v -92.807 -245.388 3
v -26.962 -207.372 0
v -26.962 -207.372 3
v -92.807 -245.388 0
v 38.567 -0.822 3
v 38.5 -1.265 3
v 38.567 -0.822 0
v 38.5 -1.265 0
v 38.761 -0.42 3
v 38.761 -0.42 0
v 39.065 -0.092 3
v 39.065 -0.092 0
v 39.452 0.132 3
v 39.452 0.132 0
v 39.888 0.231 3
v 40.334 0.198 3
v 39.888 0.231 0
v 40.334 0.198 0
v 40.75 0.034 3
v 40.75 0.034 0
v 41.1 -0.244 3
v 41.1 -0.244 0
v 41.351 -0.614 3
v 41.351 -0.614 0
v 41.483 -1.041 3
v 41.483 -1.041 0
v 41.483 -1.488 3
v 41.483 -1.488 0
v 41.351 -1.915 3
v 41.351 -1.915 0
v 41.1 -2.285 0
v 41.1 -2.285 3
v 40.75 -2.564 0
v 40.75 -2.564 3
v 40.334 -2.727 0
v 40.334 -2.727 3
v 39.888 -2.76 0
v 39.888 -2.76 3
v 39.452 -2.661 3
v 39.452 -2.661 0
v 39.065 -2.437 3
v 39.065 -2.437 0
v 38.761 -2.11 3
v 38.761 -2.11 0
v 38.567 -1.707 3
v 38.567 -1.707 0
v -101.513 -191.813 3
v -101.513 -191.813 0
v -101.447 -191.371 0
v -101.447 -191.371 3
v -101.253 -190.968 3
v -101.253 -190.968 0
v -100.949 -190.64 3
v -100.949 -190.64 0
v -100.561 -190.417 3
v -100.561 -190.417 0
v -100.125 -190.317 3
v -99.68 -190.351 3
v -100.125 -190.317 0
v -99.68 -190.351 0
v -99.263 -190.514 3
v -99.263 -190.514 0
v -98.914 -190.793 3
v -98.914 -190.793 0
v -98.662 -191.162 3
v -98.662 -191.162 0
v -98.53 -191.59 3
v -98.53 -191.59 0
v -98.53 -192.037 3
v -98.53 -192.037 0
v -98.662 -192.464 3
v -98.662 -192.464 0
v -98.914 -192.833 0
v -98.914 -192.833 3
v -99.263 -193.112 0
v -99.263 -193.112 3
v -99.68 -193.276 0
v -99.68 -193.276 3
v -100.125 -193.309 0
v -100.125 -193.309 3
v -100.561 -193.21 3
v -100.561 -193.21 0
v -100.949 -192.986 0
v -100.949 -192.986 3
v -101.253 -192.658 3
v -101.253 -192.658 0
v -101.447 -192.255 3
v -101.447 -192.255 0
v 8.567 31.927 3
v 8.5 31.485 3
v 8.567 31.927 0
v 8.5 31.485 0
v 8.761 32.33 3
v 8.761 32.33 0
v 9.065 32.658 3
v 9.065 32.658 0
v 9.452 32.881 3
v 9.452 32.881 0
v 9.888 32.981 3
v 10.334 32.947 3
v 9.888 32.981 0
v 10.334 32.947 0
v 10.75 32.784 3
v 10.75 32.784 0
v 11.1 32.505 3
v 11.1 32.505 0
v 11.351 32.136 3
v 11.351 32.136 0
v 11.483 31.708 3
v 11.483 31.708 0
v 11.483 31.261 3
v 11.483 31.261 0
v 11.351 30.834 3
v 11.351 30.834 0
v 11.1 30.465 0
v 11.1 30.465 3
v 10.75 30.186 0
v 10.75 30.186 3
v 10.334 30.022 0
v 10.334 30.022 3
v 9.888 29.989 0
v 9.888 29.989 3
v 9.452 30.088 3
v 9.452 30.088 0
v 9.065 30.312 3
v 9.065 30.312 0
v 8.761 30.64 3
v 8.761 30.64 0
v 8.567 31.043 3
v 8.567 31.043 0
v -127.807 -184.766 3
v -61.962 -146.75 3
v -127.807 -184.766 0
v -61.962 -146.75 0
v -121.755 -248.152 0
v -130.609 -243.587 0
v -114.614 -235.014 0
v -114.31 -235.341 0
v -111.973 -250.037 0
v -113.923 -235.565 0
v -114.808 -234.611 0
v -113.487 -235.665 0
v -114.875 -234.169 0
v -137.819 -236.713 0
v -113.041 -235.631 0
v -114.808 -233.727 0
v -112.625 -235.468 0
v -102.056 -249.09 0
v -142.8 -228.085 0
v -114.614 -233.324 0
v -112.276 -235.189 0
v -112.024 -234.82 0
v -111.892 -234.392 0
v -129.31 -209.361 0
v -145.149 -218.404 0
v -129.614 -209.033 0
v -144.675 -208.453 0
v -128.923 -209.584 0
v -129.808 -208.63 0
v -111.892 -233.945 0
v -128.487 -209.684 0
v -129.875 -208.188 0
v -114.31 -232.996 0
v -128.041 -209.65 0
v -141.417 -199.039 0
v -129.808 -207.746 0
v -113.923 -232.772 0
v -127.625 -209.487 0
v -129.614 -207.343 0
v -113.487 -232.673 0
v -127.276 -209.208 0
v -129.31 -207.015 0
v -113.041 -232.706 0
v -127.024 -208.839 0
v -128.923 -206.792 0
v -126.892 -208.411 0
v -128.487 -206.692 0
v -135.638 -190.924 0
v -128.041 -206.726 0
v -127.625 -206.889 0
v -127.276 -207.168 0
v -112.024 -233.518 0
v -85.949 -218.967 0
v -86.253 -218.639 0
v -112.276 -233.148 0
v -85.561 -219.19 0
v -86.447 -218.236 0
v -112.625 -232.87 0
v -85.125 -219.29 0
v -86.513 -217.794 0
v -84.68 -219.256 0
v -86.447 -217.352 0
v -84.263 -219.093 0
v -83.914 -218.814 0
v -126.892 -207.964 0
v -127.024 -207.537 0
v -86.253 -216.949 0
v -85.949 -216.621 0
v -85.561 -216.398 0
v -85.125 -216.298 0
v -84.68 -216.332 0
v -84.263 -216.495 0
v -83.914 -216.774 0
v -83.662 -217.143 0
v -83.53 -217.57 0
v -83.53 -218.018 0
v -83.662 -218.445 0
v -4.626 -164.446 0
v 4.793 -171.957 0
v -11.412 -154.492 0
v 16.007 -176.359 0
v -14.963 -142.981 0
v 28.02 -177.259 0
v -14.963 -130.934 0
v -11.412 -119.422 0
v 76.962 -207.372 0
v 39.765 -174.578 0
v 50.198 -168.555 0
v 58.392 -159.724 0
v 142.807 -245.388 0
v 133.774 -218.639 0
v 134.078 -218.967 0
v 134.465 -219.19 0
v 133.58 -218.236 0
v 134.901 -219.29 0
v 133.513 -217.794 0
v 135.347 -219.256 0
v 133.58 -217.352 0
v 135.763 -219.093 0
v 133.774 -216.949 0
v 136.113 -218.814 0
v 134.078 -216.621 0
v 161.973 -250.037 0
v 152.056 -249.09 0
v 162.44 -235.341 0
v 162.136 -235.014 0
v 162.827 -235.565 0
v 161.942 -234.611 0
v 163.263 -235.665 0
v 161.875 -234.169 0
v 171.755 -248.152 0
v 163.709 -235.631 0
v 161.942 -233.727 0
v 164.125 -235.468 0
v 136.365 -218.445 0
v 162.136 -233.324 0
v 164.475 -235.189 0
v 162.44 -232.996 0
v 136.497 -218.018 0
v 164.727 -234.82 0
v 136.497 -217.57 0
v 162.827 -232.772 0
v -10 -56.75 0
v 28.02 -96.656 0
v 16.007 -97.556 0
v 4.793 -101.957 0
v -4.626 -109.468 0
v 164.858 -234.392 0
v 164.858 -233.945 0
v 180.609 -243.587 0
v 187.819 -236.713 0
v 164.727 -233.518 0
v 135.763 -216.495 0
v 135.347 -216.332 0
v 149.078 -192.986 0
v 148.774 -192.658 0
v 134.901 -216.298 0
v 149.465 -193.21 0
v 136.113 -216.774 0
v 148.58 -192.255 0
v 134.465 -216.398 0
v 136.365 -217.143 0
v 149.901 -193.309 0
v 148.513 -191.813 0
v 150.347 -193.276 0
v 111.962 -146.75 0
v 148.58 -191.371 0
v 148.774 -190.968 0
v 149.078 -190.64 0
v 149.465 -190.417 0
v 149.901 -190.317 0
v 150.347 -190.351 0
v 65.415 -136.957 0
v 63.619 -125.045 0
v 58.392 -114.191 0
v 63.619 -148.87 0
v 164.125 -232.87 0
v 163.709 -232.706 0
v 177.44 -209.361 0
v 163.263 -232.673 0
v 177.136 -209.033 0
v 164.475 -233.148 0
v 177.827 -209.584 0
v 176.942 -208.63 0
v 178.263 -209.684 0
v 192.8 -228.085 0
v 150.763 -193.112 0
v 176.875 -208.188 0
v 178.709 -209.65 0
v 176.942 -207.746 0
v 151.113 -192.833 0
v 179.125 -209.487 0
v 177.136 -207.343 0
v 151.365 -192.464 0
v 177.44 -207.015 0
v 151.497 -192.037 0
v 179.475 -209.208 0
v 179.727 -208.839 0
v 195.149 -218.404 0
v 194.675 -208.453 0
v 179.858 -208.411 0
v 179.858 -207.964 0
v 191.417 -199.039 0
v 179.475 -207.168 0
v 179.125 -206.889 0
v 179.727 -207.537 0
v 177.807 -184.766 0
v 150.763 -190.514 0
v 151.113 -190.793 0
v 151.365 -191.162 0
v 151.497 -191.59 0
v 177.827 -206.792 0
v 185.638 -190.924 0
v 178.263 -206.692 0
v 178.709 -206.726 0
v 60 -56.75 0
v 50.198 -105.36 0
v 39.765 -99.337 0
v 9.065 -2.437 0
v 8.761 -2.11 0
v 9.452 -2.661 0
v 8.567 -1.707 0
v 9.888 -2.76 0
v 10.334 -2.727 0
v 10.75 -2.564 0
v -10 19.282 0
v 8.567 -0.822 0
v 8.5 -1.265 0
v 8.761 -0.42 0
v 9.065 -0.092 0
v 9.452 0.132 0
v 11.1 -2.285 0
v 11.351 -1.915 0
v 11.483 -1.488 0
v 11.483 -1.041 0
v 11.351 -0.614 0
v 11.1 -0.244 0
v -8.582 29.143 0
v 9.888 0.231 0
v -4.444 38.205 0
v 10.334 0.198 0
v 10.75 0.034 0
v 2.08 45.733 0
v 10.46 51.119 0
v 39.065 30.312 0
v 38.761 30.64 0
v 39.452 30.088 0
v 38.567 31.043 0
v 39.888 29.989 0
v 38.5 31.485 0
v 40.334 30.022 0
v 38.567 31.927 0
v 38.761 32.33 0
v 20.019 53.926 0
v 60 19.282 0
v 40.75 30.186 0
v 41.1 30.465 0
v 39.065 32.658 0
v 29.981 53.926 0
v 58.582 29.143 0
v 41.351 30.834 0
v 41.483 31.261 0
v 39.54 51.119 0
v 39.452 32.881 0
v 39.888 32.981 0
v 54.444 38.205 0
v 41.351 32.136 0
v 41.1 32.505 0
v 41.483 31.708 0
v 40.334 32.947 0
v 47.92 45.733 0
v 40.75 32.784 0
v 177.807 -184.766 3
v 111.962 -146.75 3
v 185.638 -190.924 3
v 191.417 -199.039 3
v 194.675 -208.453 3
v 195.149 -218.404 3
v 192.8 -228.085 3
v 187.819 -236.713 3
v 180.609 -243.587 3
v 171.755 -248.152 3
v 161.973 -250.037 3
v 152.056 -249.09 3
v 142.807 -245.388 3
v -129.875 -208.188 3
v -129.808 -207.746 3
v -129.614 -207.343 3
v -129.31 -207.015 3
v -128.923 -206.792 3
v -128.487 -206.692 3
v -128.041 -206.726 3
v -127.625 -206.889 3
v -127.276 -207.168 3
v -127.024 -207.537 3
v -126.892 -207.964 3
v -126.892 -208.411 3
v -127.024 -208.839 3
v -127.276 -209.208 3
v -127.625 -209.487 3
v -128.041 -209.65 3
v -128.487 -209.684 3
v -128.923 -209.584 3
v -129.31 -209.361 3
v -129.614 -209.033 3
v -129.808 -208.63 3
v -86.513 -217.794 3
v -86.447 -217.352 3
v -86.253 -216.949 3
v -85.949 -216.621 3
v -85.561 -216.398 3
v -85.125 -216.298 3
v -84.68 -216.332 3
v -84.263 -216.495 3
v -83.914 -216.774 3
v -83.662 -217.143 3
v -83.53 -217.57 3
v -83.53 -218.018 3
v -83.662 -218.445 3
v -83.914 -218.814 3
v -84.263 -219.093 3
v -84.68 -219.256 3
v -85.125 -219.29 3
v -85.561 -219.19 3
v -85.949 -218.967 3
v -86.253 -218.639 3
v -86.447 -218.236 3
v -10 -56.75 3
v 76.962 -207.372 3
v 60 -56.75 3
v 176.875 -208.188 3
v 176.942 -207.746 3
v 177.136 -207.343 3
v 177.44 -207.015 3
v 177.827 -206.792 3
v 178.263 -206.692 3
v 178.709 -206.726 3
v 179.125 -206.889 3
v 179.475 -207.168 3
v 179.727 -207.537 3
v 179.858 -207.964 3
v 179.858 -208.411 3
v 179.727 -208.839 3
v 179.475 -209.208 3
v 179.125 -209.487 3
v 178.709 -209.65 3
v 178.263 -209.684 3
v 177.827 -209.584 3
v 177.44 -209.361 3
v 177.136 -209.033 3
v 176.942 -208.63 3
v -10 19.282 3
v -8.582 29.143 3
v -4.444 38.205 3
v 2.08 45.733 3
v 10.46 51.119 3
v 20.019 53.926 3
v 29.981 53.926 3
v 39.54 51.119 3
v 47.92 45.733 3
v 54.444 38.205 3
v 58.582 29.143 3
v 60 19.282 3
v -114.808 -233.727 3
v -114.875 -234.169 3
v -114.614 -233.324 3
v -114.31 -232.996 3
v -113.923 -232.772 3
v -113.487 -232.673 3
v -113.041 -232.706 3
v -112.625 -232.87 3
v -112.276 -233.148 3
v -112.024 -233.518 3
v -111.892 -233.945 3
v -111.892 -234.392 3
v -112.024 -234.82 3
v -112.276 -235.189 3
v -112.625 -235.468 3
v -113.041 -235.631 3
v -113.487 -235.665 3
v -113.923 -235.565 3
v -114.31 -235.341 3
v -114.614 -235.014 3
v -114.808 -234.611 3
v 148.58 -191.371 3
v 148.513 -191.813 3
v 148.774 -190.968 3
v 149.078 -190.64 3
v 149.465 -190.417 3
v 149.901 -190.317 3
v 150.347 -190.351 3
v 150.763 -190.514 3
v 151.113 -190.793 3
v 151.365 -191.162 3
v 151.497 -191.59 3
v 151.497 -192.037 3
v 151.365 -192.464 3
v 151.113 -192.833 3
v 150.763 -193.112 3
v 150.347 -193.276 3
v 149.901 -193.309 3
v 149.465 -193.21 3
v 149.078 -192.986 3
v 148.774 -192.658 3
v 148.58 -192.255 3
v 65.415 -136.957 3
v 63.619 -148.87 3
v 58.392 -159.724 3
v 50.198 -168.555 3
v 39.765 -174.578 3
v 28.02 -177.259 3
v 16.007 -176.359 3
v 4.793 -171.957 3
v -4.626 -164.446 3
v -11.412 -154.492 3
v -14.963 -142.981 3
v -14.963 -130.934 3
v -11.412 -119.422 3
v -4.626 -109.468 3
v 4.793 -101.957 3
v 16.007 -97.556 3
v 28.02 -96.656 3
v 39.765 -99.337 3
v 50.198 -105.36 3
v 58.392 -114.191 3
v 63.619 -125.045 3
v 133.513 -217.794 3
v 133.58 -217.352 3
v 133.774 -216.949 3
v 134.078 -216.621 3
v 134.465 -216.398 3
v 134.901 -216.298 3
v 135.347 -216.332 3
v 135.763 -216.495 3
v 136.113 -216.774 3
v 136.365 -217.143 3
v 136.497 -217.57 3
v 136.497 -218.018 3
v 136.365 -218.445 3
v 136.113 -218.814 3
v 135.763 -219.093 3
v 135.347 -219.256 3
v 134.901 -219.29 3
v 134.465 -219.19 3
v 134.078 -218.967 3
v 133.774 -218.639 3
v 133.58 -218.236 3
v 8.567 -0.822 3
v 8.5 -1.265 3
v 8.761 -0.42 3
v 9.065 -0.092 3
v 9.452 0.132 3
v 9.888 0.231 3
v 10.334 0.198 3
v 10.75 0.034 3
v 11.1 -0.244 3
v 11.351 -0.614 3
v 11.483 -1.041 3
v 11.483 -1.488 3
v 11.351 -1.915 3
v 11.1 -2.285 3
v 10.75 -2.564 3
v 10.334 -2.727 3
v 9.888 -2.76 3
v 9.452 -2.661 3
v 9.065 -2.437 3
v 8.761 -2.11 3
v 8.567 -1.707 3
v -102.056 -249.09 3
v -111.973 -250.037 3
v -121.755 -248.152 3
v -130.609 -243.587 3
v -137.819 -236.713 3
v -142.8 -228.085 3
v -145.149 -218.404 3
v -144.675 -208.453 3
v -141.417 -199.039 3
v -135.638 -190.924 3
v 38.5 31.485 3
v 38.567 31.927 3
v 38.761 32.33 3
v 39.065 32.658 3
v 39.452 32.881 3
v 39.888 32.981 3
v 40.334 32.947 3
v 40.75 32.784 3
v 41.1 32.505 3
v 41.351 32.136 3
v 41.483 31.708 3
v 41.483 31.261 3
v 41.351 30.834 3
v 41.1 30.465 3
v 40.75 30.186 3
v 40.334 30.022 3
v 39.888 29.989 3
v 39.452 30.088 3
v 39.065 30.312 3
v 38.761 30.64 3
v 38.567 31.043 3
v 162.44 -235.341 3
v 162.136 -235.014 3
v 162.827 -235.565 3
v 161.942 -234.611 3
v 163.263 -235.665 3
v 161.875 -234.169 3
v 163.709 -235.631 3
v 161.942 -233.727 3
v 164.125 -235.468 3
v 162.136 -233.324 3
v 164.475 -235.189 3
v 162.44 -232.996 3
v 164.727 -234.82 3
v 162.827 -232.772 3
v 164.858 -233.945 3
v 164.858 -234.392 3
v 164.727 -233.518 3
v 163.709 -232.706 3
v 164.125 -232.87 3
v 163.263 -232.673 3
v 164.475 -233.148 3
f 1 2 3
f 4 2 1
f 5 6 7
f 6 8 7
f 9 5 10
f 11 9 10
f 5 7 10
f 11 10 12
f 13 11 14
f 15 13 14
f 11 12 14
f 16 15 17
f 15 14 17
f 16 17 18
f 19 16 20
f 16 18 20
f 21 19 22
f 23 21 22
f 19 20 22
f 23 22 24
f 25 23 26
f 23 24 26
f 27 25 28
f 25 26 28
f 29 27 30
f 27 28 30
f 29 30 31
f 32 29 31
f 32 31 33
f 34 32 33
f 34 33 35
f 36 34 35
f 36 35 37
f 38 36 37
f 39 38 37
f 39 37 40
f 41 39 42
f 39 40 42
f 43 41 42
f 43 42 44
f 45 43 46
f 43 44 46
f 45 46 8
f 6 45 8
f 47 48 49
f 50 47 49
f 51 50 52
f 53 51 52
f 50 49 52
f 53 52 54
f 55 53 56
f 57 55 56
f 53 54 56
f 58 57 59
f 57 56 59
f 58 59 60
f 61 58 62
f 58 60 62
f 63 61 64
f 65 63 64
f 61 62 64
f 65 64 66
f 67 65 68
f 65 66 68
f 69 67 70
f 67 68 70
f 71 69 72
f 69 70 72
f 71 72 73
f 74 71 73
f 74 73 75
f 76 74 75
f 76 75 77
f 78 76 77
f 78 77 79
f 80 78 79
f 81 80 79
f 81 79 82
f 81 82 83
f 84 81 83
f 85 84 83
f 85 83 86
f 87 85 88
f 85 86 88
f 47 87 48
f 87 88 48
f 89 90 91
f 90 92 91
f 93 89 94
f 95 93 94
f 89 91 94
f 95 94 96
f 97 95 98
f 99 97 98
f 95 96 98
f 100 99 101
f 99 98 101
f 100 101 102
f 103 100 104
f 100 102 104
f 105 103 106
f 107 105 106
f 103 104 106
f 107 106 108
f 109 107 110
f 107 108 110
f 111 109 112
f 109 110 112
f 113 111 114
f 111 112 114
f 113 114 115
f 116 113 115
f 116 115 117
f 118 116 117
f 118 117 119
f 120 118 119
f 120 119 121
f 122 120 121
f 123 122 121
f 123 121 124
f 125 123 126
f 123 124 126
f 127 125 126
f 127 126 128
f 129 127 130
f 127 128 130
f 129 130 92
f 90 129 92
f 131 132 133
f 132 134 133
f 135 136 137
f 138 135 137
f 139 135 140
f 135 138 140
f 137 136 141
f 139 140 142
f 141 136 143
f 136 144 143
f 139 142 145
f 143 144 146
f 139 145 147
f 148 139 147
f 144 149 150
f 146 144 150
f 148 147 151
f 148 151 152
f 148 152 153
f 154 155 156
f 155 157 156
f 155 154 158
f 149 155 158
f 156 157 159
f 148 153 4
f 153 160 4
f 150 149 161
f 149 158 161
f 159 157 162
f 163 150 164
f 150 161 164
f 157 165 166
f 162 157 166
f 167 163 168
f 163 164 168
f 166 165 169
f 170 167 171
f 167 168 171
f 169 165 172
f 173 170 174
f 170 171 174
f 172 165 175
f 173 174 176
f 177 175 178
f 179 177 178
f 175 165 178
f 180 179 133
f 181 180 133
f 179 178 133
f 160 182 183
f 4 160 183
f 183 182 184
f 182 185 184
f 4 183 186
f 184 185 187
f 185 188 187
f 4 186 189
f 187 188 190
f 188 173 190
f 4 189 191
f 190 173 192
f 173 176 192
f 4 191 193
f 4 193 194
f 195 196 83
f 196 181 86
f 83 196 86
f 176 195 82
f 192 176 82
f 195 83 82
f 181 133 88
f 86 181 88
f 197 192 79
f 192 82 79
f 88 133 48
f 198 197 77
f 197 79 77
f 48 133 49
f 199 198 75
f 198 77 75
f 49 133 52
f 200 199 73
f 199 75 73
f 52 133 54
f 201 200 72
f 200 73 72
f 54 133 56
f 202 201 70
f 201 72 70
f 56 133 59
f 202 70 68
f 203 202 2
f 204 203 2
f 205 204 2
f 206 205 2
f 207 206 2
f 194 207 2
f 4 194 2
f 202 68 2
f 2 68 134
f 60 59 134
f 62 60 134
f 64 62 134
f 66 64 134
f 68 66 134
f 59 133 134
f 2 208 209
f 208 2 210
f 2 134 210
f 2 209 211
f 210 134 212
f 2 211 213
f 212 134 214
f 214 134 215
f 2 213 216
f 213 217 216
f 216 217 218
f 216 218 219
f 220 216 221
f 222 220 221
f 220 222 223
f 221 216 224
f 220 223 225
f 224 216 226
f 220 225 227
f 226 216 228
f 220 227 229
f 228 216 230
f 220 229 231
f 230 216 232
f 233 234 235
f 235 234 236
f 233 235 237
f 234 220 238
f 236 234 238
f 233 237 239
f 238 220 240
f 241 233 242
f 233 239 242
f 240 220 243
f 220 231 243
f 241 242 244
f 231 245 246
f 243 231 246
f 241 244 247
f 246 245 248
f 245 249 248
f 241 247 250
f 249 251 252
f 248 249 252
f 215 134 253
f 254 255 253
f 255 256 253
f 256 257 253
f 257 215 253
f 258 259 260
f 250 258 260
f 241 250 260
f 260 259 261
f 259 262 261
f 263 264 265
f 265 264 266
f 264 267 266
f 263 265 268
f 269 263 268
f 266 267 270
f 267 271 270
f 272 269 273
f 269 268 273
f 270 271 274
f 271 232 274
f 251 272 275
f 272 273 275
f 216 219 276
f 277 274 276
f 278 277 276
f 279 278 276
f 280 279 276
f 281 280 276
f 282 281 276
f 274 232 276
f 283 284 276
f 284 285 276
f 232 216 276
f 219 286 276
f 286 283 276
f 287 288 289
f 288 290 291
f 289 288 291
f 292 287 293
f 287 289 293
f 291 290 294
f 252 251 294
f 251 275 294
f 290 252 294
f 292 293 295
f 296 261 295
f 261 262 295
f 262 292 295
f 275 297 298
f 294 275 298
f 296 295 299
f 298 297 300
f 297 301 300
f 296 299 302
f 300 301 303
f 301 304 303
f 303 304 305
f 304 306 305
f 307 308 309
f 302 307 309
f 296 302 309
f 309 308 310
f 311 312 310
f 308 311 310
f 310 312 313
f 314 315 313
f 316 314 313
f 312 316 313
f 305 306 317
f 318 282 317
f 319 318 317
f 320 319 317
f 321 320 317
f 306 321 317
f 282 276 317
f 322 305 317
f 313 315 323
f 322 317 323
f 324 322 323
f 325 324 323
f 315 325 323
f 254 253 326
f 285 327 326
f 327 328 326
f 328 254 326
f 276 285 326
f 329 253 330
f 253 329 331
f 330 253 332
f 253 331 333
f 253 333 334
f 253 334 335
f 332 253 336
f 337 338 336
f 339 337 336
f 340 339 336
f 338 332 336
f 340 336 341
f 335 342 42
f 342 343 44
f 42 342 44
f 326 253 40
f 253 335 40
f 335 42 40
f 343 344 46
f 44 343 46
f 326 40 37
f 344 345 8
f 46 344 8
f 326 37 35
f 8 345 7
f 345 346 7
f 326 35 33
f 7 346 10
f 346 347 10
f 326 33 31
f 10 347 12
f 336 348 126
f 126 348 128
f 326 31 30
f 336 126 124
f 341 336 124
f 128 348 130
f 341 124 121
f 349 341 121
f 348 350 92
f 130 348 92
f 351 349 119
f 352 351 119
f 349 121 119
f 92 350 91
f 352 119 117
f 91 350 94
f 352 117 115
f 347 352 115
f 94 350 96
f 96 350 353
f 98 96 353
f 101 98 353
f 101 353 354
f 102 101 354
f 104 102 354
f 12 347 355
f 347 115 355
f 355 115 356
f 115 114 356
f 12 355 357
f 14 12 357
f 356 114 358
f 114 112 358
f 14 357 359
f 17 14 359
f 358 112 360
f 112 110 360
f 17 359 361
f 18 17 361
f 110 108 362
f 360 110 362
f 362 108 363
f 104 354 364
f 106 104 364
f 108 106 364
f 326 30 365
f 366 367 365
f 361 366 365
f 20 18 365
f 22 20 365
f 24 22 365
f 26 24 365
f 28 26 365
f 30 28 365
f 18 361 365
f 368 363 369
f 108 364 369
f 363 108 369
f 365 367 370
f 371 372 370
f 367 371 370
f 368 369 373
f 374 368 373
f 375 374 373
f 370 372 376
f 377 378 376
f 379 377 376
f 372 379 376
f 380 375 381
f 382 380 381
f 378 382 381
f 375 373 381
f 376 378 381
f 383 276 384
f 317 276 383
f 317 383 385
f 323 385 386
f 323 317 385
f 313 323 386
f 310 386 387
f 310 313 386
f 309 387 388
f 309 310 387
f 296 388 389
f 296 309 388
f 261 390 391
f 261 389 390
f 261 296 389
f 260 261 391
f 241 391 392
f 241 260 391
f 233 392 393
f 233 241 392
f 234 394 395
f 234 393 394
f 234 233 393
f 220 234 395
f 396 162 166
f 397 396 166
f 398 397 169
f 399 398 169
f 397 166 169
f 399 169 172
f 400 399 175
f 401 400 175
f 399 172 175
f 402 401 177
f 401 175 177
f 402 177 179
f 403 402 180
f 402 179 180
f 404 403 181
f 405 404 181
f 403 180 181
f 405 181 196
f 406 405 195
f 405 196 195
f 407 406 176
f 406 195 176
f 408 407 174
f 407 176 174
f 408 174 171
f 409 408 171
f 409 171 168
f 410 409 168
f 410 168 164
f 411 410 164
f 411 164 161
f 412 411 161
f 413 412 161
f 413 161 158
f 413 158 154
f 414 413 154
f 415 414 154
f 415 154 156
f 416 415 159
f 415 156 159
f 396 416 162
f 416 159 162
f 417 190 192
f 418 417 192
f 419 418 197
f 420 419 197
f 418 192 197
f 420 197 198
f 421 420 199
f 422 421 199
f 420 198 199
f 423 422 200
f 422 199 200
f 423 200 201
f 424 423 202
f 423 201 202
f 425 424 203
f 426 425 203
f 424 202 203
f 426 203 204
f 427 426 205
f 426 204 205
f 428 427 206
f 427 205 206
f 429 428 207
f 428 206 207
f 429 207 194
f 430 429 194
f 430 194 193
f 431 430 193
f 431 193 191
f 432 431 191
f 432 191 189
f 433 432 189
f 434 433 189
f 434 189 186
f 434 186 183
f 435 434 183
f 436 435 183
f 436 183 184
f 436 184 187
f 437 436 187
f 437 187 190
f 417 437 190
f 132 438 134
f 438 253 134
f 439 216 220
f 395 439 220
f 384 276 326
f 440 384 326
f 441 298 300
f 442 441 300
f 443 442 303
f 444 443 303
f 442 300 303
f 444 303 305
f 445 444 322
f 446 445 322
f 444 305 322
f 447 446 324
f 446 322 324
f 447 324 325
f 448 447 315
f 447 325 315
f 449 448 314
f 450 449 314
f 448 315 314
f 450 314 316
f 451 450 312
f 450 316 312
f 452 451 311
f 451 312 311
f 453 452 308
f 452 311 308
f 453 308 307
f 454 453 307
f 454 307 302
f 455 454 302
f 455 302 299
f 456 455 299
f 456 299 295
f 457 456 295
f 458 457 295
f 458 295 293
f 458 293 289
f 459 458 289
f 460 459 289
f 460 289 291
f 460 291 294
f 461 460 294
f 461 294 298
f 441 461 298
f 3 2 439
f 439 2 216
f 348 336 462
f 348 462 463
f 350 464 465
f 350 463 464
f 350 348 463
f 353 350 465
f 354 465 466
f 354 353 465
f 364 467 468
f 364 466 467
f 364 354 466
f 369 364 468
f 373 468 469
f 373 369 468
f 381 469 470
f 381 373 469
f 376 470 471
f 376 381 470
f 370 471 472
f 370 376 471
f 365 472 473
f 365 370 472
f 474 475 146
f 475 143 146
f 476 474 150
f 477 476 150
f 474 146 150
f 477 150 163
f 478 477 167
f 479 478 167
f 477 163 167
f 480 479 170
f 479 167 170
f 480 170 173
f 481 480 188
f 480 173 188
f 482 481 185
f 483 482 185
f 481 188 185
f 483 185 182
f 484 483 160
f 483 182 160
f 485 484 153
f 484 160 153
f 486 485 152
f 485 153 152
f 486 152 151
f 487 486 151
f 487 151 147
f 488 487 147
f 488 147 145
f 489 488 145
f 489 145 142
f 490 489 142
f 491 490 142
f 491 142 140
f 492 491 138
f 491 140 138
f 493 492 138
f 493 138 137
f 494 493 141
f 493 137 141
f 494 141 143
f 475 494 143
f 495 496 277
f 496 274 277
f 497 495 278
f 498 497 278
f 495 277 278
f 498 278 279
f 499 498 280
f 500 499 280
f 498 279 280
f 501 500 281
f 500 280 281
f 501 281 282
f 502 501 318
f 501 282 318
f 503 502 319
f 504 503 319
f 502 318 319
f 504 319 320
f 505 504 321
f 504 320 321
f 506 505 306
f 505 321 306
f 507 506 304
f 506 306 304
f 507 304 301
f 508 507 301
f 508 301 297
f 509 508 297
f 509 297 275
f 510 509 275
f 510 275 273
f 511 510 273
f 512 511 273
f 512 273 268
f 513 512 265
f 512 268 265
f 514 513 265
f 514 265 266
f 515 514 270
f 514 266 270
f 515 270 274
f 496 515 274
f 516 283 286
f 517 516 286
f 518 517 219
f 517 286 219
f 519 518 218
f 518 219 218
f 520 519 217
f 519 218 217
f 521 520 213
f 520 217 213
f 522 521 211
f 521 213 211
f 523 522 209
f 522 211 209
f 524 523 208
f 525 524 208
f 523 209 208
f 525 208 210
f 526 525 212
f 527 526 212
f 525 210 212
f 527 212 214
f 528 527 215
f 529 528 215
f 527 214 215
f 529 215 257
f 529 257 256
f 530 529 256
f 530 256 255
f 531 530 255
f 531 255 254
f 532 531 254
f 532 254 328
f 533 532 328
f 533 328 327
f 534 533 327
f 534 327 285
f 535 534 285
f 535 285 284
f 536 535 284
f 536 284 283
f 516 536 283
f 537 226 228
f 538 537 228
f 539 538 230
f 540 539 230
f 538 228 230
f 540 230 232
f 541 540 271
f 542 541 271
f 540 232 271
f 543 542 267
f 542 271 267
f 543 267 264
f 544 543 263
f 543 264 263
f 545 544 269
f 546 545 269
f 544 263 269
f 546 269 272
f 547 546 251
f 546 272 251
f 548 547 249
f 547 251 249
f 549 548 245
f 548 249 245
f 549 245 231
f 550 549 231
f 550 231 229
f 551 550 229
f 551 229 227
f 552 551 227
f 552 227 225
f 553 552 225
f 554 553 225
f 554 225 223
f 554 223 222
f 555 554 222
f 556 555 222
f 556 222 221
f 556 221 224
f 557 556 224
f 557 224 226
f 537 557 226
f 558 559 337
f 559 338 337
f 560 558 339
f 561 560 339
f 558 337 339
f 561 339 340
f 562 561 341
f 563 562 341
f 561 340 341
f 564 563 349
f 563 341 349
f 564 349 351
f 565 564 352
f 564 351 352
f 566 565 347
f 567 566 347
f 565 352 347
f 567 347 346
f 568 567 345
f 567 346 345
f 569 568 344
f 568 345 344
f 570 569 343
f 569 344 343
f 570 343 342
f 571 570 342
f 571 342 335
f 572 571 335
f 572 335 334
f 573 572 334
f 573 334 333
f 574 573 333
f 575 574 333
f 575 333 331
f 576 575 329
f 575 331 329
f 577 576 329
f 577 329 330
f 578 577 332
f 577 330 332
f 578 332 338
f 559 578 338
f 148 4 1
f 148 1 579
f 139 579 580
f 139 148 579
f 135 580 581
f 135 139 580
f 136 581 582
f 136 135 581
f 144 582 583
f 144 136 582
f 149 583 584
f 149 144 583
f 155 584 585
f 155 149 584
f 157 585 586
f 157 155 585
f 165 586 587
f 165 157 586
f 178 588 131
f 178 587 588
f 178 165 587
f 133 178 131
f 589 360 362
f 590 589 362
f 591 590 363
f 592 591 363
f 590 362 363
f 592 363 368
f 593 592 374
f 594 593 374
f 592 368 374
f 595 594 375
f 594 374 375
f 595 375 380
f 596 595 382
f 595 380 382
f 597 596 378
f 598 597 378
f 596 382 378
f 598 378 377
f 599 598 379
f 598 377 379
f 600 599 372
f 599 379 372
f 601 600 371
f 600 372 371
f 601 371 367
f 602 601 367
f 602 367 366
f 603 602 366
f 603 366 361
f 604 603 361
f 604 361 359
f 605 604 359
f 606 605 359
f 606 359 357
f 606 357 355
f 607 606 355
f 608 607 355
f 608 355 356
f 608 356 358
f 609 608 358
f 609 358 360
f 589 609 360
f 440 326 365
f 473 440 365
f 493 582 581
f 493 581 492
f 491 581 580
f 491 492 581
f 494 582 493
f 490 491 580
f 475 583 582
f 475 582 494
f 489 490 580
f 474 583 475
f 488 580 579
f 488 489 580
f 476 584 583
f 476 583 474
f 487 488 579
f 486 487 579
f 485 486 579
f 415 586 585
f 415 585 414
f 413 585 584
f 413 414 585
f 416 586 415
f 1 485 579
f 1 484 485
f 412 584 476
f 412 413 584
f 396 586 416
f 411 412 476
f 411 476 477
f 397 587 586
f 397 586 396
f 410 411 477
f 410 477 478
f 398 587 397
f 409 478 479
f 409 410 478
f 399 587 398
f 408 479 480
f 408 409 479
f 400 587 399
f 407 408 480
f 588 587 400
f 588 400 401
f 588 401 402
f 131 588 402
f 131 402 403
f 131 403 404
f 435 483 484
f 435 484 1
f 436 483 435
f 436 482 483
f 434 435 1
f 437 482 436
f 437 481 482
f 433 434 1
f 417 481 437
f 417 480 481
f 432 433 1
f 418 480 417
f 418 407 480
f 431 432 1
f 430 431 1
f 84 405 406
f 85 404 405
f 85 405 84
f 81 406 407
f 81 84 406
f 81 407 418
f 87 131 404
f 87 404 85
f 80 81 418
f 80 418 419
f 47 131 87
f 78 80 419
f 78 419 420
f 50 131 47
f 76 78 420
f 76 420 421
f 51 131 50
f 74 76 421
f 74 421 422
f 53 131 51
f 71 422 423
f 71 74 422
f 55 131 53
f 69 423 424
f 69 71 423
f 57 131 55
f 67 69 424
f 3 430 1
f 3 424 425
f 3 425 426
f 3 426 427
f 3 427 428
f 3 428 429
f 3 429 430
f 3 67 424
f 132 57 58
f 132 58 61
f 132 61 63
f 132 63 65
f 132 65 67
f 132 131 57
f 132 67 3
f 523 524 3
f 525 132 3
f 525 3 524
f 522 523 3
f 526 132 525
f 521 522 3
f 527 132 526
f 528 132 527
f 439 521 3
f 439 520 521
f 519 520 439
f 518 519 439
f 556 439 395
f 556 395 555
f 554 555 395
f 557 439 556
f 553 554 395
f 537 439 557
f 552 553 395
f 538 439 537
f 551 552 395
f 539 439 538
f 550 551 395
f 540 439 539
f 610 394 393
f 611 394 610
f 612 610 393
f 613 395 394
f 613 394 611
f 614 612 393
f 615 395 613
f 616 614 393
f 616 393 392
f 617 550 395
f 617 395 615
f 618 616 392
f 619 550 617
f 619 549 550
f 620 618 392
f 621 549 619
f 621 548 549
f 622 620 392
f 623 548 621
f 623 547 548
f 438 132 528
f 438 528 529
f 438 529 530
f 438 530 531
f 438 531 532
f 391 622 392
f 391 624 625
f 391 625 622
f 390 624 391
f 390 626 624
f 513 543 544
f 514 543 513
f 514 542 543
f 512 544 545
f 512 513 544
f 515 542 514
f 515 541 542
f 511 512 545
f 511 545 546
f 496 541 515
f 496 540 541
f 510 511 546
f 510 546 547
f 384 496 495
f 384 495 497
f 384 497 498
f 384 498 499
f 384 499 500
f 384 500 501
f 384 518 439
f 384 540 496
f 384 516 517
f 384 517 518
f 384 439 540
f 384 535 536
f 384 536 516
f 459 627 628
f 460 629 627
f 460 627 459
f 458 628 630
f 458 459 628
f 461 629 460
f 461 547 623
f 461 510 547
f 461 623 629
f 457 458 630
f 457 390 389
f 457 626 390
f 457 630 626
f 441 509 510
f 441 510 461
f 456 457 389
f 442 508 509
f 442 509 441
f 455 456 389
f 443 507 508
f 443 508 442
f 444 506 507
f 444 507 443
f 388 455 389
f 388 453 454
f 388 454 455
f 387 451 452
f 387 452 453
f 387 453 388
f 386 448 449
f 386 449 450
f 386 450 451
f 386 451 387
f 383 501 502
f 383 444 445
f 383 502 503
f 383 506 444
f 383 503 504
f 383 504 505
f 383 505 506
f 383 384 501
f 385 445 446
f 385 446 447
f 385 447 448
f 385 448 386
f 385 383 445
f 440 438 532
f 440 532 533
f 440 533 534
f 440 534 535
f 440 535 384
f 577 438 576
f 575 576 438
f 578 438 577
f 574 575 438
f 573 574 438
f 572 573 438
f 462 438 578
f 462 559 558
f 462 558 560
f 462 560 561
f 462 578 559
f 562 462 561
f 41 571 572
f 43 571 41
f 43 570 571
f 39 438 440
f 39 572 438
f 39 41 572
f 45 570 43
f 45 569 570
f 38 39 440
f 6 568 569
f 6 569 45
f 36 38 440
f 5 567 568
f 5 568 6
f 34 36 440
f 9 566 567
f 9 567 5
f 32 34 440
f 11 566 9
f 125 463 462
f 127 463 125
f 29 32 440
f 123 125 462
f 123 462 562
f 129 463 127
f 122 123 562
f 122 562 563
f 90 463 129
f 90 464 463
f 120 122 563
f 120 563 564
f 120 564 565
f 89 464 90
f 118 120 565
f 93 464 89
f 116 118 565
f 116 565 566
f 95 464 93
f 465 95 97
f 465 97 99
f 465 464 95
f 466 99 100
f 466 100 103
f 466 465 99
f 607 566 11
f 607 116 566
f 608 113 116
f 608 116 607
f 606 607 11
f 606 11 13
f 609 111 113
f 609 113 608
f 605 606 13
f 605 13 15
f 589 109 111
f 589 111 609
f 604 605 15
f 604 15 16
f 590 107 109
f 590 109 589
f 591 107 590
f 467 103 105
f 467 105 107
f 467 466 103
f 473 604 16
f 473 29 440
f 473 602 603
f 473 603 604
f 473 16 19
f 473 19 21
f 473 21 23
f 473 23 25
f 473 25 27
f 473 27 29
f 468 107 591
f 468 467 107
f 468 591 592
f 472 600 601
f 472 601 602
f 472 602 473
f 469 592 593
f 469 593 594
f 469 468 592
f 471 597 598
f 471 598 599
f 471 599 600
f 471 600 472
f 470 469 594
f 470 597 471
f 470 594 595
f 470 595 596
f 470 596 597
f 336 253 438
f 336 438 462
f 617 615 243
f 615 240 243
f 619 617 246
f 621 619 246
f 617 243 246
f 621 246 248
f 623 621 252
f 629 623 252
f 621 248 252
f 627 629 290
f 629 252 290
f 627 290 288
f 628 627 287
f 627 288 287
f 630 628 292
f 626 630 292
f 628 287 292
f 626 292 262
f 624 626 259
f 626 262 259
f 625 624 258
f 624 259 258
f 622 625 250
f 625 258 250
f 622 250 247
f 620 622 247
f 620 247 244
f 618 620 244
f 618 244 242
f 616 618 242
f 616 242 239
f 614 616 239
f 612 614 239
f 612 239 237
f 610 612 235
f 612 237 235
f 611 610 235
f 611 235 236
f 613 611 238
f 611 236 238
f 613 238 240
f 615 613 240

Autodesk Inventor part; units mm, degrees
ref_plane "YZ Plane" through (0, 0, 0) normal (1, 0, 0) x (0, 1, 0)
ref_plane "XZ Plane" through (0, 0, 0) normal (0, 1, 0) x (-1, 0, 0)
ref_plane "XY Plane" through (0, 0, 0) normal (0, 0, 1) x (1, 0, 0)
ref_plane "Work Plane1" through (0, 0, 0) normal (0, 0, 1) x (1, 0, 0)
sketch "Sketch1" plane through (0, 0, 0) normal (0, 0, 1) x (1, 0, 0)
  circle A0 centre (25, -136.9573) radius 110
  line L0 (-96.6901, -226.845) -> (-113.6901, -197.4001)
  line L1 (-101.8073, -229.7994) -> (-118.8073, -200.3545)
  line L2 (163.6901, -197.4001) -> (146.6901, -226.845)
  line L3 (168.8073, -200.3545) -> (151.8073, -229.7994)
  line L4 (8, 13.3733) -> (42, 13.3733)
  line L5 (8, 19.2822) -> (42, 19.2822)
  line L6 (25, -136.9573) -> (25, 19.2822)
  line L7 (25, -136.9573) -> (160.3073, -215.077)
  line L8 (25, -136.9573) -> (-110.3073, -215.077)
  line L9 (-10, -135.9724) -> (-10, 19.2822)
  line L10 (60, -135.9724) -> (60, 19.2822)
  line L11 (43.3529, -107.1388) -> (177.8073, -184.7661)
  line L12 (8.3529, -167.7605) -> (142.8073, -245.3879)
  line L13 (41.6471, -167.7605) -> (-92.8073, -245.3879)
  line L14 (6.6471, -107.1388) -> (-127.8073, -184.7661)
  arc A1 (142.8073, -245.3879) -> (177.8073, -184.7661) centre (160.3073, -215.077) ccw
  arc A2 (60, 19.2822) -> (-10, 19.2822) centre (25, 19.2822) ccw
  arc A3 (-127.8073, -184.7661) -> (-92.8073, -245.3879) centre (-110.3073, -215.077) ccw
  line L15 (25, -177.3718) -> (76.9615, -207.3718)
  line L16 (-10, -116.75) -> (-61.9615, -146.75)
  line L17 (-10, -116.75) -> (-10, -56.75)
  line L18 (60, -116.75) -> (60, -56.75)
  line L19 (60, -116.75) -> (111.9615, -146.75)
  line L20 (111.9615, -146.75) -> (60, -56.75)
  line L21 (-10, -56.75) -> (-61.9615, -146.75)
  line L22 (25, -177.3718) -> (-26.9615, -207.3718)
  line L23 (-26.9615, -207.3718) -> (76.9615, -207.3718)
  circle A4 centre (25, -136.9573) radius 40.4145
  point P0 (0, 0)
extrude "Extrusion1" add sketch "Sketch1" along normal blind 3 contours L10 A4 L6 A0 | A0 L9 A2 L10 | L11 A1 L12 A0 | A0 L7 A4 L11 | L6 A4 L9 A0 | L20 L11 L10 | A0 L12 A4 L7 | L14 A4 L8 A0 | A0 L13 A3 L14 | L9 L14 L21 | A0 L8 A4 L13 | L23 L13 L12
sketch "Sketch3" plane through (0, 0, 0) normal (0, 0, -1) x (-1, 0, 0)
  circle A0 centre (-40, -1.2646) radius 1.5 projected
  circle A1 centre (-10, -1.2646) radius 1.5 projected
  circle A2 centre (-10, 31.4848) radius 1.5 projected
  circle A3 centre (-40, 31.4848) radius 1.5 projected
  circle A4 centre (113.3751, -234.1687) radius 1.5 projected
  circle A5 centre (85.0133, -217.794) radius 1.5 projected
  circle A6 centre (100.0133, -191.8132) radius 1.5 projected
  circle A7 centre (128.3751, -208.1879) radius 1.5 projected
  circle A8 centre (-135.0133, -217.794) radius 1.5 projected
  circle A9 centre (-163.3751, -234.1687) radius 1.5 projected
  circle A10 centre (-178.3751, -208.1879) radius 1.5 projected
  circle A11 centre (-150.0133, -191.8132) radius 1.5 projected
  point P0 (0, 0)
extrude "Extrusion2" cut sketch "Sketch3" against normal blind 6
properties part number "Bund"
